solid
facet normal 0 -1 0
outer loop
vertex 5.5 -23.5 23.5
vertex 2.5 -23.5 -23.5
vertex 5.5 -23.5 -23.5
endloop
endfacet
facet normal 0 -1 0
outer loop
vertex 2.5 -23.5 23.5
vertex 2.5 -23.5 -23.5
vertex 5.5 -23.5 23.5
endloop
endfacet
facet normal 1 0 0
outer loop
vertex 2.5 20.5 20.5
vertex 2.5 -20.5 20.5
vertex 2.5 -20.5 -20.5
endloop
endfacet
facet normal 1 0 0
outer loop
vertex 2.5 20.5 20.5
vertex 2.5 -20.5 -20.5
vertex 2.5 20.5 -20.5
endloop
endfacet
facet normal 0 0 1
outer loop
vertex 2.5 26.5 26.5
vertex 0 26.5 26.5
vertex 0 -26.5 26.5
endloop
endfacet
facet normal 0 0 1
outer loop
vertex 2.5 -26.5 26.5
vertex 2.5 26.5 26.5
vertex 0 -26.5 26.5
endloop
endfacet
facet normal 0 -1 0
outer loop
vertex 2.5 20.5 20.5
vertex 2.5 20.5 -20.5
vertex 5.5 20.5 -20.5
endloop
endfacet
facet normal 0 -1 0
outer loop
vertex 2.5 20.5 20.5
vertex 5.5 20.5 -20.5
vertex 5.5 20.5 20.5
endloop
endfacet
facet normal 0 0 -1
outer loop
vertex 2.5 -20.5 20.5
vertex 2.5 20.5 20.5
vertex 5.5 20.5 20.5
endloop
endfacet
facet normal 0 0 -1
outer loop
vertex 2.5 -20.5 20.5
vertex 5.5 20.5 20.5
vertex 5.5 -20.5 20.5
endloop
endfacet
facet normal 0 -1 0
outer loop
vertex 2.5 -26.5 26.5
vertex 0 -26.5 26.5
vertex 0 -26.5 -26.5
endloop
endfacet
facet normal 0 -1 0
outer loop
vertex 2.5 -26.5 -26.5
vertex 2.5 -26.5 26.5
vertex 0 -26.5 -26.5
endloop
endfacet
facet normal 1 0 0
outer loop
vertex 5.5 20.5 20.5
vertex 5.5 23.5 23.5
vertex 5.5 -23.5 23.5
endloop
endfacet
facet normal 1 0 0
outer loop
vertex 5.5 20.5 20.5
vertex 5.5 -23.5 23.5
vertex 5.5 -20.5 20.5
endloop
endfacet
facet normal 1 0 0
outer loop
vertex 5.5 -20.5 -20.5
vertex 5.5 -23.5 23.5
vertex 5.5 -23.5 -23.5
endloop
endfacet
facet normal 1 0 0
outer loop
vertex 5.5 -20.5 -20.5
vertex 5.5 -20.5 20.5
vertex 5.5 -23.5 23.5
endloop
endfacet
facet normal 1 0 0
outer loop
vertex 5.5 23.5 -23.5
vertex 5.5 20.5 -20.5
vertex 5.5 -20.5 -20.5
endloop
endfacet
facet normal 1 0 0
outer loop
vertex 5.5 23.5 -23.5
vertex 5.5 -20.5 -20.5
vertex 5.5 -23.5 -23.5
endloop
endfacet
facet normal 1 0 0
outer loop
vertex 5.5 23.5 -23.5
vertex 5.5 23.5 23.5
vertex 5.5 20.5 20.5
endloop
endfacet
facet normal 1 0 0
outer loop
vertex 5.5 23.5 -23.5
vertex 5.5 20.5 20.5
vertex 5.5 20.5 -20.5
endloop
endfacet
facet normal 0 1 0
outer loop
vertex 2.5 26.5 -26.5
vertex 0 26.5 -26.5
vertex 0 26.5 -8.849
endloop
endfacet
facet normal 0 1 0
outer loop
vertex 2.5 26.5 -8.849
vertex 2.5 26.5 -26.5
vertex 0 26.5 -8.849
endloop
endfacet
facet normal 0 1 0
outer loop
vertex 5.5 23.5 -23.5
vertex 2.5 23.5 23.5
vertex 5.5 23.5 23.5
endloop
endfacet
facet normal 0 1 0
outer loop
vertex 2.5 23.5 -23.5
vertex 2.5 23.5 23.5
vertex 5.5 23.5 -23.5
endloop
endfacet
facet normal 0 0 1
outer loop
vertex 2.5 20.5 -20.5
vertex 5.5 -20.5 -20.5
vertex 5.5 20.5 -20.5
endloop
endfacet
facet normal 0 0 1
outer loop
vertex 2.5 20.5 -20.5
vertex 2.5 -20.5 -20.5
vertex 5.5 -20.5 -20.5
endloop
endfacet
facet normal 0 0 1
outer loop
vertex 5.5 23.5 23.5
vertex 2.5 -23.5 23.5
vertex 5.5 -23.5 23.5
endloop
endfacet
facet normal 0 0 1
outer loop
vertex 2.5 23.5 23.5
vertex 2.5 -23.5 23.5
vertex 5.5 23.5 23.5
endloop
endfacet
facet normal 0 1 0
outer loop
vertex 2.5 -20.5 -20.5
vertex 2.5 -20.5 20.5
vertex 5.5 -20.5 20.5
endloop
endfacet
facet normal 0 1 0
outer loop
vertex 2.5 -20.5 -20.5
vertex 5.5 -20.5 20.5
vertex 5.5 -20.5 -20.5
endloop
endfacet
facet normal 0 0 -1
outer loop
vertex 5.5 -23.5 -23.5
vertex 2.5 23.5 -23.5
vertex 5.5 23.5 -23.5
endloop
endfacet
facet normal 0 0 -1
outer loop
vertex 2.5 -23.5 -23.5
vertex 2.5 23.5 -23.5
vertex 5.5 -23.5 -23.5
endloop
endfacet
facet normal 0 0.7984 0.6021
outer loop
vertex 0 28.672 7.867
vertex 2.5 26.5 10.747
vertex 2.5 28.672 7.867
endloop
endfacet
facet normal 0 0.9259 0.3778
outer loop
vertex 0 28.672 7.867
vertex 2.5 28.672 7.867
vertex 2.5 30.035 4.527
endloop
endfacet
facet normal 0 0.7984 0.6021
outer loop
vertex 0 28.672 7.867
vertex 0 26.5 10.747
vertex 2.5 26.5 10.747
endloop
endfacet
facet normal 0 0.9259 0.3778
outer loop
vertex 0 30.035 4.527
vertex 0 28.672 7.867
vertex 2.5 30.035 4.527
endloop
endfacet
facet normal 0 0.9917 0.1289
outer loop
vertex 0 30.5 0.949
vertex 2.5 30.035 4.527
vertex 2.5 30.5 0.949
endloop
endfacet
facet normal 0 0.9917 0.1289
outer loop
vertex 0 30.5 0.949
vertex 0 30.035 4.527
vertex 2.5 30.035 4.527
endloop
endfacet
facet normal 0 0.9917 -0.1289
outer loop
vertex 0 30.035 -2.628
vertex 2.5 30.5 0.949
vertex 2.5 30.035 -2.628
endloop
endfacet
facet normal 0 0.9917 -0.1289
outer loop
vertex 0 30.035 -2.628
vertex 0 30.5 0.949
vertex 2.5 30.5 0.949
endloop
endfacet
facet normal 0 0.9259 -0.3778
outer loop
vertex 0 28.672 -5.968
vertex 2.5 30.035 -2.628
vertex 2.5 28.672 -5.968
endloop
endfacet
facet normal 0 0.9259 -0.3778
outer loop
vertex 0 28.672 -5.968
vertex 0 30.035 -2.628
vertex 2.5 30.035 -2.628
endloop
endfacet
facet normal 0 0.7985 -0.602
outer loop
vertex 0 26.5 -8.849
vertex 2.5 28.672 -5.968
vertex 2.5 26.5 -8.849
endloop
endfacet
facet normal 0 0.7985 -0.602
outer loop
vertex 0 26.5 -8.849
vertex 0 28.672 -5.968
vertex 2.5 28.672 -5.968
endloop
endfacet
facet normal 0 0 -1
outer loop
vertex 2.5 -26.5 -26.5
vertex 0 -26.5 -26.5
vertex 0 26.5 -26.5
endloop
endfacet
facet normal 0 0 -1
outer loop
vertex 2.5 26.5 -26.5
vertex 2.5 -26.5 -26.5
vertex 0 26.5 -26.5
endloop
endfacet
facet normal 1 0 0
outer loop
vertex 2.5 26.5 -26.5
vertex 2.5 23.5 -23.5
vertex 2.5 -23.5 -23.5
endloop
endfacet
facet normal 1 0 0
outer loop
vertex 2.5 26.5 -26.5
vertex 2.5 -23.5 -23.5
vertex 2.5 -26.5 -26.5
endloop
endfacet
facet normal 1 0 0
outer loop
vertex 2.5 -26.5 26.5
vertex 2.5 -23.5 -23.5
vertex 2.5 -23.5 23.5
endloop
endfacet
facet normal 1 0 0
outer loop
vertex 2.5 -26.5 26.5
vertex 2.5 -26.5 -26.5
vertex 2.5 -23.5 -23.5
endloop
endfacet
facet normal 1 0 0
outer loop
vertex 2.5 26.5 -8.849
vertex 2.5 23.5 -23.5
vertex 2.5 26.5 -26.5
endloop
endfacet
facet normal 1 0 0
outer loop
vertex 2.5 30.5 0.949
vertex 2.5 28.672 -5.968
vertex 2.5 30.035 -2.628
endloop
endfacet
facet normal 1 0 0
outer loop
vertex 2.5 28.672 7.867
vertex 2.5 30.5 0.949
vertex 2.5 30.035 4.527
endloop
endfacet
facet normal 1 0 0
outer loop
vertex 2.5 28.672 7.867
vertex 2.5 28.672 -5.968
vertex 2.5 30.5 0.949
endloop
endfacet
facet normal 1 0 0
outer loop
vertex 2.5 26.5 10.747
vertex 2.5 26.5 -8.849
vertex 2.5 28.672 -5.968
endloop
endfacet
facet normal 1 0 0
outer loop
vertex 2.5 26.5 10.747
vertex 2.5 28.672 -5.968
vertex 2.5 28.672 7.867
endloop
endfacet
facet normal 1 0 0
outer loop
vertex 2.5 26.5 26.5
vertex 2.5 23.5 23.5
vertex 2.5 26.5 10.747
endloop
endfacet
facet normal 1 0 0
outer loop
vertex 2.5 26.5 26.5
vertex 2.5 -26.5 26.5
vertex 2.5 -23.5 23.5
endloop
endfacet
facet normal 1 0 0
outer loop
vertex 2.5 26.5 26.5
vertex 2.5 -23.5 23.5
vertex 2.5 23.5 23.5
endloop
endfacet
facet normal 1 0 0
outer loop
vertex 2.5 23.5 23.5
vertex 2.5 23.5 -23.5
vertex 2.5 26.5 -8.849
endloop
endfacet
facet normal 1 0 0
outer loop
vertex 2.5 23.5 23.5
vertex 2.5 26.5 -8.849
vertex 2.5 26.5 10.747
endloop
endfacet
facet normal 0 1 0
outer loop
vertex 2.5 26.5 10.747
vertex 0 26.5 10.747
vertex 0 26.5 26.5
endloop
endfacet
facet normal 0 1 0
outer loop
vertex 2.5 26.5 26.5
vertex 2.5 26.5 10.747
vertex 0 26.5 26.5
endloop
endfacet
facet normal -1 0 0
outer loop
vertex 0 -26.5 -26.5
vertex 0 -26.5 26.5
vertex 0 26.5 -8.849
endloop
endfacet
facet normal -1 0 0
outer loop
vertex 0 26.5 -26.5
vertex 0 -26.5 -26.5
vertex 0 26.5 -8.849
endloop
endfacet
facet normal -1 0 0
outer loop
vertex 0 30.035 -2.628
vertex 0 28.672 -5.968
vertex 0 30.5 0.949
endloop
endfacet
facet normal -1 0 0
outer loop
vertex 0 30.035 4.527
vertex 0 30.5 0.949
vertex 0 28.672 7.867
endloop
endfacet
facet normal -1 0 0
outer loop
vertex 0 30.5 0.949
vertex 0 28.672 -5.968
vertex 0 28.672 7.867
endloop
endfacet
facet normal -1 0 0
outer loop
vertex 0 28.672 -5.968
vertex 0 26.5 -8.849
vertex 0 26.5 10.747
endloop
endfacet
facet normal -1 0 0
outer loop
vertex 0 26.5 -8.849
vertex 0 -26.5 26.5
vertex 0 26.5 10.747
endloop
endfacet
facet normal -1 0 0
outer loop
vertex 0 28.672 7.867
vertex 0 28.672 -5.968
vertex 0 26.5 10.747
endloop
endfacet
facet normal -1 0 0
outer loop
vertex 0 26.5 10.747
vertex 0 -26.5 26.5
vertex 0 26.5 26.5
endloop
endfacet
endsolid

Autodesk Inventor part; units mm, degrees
ref_plane "YZ Plane" through (0, 0, 0) normal (1, 0, 0) x (0, 1, 0)
ref_plane "XZ Plane" through (0, 0, 0) normal (0, 1, 0) x (-1, 0, 0)
ref_plane "XY Plane" through (0, 0, 0) normal (0, 0, 1) x (1, 0, 0)
sketch "Skizze4" plane through (0, 0, 0) normal (1, 0, 0) x (0, 1, 0)
  line L0 (26.5, 26.5) -> (-26.5, 26.5)
  line L1 (-26.5, 26.5) -> (-26.5, -26.5)
  line L2 (-26.5, -26.5) -> (26.5, -26.5)
  line L3 (26.5, -26.5) -> (26.5, 26.5)
  line L4 (0, -37.1) -> (0, 37.1) construction
  line L5 (-37.1, 0) -> (37.1, 0) construction
  dimension "d18" = 53
  dimension "d19" = 53
extrude "Extrusion2" add sketch "Skizze4" along normal blind 2.5
sketch "Skizze5" plane through (2.5, 0, 0) normal (1, 0, 0) x (0, 0, -1)
  line L0 (-26.5, -26.5) -> (26.5, -26.5) construction
  line L1 (26.5, -26.5) -> (26.5, 26.5) construction
  line L2 (26.5, 26.5) -> (-26.5, 26.5) construction
  line L3 (-26.5, 26.5) -> (-26.5, -26.5) construction
  line L4 (-23.5, 23.5) -> (23.5, 23.5)
  line L5 (23.5, 23.5) -> (23.5, -23.5)
  line L6 (23.5, -23.5) -> (-23.5, -23.5)
  line L7 (-23.5, -23.5) -> (-23.5, 23.5)
  line L8 (20.5, 20.5) -> (-20.5, 20.5)
  line L9 (-20.5, 20.5) -> (-20.5, -20.5)
  line L10 (-20.5, -20.5) -> (20.5, -20.5)
  line L11 (20.5, -20.5) -> (20.5, 20.5)
  point P0 (0, 0)
  dimension "d8" = 3
  dimension "d9" = 3
extrude "Extrusion3" add sketch "Skizze5" along normal blind 3
sketch "Skizze6" plane through (0, 0, 0) normal (-1, 0, 0) x (0, 0, 1)
  line L0 (26.5, 26.5) -> (-26.5, 26.5) construction
  line L1 (26.5, -26.5) -> (26.5, 26.5) construction
  line L2 (-26.5, 26.5) -> (-26.5, 0) construction
  line L3 (0, -5.395) -> (0, 39.3226) construction
  line L4 (-26.5, 26.5) -> (26.5, 26.5) projected
  arc A0 (10.7474, 26.5) -> (-8.8486, 26.5) centre (0.9494, 16.5) ccw
  point P0 (0, 0)
  dimension "d12" = 26.5
  dimension "d13" = 53
  dimension "d14" = 14
  dimension "d15" = 10
extrude "Extrusion4" add sketch "Skizze6" against normal up to surface (2.5 mm away)
equation "\"d19\" = d18"
equation "\"d12\" = 0.5 * d13"
properties part number "Modul Deckel" material "Kst - PC/Makrolon (clear)"
